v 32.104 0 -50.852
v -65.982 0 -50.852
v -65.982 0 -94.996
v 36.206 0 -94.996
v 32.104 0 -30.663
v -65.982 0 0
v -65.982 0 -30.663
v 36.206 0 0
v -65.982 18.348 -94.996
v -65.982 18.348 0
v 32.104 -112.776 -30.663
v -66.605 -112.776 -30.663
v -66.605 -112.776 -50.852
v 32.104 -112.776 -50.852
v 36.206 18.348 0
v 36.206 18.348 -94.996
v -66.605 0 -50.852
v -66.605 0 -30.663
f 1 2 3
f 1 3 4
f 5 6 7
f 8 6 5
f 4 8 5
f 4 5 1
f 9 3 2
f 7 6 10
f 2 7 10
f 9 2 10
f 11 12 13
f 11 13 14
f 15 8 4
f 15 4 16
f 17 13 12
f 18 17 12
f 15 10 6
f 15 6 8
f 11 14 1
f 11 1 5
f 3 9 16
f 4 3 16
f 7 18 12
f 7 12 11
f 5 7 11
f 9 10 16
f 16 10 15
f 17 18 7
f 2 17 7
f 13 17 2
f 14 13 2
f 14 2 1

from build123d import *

# Parameters (mm, degrees)
F0_W     = 102.187556
F0_H     = 18.34783
F1_DEPTH = 94.996
F2_W     = 98.708875
F2_H     = 20.189193
F3_DEPTH = 112.776


with BuildPart() as f1:
    # F0 (on Top) → F1 (new body)
    with BuildSketch(Plane.XY):
        with Locations((-14.888035, 9.173915)):
            Rectangle(F0_W, F0_H)
    extrude(amount=-F1_DEPTH)

    # F2 (on Front) → F3 (join)
    with BuildSketch(Plane.XZ):
        with Locations((-17.250094, -40.75765)):
            Rectangle(F2_W, F2_H)
    extrude(amount=F3_DEPTH)


solid = f1.part
